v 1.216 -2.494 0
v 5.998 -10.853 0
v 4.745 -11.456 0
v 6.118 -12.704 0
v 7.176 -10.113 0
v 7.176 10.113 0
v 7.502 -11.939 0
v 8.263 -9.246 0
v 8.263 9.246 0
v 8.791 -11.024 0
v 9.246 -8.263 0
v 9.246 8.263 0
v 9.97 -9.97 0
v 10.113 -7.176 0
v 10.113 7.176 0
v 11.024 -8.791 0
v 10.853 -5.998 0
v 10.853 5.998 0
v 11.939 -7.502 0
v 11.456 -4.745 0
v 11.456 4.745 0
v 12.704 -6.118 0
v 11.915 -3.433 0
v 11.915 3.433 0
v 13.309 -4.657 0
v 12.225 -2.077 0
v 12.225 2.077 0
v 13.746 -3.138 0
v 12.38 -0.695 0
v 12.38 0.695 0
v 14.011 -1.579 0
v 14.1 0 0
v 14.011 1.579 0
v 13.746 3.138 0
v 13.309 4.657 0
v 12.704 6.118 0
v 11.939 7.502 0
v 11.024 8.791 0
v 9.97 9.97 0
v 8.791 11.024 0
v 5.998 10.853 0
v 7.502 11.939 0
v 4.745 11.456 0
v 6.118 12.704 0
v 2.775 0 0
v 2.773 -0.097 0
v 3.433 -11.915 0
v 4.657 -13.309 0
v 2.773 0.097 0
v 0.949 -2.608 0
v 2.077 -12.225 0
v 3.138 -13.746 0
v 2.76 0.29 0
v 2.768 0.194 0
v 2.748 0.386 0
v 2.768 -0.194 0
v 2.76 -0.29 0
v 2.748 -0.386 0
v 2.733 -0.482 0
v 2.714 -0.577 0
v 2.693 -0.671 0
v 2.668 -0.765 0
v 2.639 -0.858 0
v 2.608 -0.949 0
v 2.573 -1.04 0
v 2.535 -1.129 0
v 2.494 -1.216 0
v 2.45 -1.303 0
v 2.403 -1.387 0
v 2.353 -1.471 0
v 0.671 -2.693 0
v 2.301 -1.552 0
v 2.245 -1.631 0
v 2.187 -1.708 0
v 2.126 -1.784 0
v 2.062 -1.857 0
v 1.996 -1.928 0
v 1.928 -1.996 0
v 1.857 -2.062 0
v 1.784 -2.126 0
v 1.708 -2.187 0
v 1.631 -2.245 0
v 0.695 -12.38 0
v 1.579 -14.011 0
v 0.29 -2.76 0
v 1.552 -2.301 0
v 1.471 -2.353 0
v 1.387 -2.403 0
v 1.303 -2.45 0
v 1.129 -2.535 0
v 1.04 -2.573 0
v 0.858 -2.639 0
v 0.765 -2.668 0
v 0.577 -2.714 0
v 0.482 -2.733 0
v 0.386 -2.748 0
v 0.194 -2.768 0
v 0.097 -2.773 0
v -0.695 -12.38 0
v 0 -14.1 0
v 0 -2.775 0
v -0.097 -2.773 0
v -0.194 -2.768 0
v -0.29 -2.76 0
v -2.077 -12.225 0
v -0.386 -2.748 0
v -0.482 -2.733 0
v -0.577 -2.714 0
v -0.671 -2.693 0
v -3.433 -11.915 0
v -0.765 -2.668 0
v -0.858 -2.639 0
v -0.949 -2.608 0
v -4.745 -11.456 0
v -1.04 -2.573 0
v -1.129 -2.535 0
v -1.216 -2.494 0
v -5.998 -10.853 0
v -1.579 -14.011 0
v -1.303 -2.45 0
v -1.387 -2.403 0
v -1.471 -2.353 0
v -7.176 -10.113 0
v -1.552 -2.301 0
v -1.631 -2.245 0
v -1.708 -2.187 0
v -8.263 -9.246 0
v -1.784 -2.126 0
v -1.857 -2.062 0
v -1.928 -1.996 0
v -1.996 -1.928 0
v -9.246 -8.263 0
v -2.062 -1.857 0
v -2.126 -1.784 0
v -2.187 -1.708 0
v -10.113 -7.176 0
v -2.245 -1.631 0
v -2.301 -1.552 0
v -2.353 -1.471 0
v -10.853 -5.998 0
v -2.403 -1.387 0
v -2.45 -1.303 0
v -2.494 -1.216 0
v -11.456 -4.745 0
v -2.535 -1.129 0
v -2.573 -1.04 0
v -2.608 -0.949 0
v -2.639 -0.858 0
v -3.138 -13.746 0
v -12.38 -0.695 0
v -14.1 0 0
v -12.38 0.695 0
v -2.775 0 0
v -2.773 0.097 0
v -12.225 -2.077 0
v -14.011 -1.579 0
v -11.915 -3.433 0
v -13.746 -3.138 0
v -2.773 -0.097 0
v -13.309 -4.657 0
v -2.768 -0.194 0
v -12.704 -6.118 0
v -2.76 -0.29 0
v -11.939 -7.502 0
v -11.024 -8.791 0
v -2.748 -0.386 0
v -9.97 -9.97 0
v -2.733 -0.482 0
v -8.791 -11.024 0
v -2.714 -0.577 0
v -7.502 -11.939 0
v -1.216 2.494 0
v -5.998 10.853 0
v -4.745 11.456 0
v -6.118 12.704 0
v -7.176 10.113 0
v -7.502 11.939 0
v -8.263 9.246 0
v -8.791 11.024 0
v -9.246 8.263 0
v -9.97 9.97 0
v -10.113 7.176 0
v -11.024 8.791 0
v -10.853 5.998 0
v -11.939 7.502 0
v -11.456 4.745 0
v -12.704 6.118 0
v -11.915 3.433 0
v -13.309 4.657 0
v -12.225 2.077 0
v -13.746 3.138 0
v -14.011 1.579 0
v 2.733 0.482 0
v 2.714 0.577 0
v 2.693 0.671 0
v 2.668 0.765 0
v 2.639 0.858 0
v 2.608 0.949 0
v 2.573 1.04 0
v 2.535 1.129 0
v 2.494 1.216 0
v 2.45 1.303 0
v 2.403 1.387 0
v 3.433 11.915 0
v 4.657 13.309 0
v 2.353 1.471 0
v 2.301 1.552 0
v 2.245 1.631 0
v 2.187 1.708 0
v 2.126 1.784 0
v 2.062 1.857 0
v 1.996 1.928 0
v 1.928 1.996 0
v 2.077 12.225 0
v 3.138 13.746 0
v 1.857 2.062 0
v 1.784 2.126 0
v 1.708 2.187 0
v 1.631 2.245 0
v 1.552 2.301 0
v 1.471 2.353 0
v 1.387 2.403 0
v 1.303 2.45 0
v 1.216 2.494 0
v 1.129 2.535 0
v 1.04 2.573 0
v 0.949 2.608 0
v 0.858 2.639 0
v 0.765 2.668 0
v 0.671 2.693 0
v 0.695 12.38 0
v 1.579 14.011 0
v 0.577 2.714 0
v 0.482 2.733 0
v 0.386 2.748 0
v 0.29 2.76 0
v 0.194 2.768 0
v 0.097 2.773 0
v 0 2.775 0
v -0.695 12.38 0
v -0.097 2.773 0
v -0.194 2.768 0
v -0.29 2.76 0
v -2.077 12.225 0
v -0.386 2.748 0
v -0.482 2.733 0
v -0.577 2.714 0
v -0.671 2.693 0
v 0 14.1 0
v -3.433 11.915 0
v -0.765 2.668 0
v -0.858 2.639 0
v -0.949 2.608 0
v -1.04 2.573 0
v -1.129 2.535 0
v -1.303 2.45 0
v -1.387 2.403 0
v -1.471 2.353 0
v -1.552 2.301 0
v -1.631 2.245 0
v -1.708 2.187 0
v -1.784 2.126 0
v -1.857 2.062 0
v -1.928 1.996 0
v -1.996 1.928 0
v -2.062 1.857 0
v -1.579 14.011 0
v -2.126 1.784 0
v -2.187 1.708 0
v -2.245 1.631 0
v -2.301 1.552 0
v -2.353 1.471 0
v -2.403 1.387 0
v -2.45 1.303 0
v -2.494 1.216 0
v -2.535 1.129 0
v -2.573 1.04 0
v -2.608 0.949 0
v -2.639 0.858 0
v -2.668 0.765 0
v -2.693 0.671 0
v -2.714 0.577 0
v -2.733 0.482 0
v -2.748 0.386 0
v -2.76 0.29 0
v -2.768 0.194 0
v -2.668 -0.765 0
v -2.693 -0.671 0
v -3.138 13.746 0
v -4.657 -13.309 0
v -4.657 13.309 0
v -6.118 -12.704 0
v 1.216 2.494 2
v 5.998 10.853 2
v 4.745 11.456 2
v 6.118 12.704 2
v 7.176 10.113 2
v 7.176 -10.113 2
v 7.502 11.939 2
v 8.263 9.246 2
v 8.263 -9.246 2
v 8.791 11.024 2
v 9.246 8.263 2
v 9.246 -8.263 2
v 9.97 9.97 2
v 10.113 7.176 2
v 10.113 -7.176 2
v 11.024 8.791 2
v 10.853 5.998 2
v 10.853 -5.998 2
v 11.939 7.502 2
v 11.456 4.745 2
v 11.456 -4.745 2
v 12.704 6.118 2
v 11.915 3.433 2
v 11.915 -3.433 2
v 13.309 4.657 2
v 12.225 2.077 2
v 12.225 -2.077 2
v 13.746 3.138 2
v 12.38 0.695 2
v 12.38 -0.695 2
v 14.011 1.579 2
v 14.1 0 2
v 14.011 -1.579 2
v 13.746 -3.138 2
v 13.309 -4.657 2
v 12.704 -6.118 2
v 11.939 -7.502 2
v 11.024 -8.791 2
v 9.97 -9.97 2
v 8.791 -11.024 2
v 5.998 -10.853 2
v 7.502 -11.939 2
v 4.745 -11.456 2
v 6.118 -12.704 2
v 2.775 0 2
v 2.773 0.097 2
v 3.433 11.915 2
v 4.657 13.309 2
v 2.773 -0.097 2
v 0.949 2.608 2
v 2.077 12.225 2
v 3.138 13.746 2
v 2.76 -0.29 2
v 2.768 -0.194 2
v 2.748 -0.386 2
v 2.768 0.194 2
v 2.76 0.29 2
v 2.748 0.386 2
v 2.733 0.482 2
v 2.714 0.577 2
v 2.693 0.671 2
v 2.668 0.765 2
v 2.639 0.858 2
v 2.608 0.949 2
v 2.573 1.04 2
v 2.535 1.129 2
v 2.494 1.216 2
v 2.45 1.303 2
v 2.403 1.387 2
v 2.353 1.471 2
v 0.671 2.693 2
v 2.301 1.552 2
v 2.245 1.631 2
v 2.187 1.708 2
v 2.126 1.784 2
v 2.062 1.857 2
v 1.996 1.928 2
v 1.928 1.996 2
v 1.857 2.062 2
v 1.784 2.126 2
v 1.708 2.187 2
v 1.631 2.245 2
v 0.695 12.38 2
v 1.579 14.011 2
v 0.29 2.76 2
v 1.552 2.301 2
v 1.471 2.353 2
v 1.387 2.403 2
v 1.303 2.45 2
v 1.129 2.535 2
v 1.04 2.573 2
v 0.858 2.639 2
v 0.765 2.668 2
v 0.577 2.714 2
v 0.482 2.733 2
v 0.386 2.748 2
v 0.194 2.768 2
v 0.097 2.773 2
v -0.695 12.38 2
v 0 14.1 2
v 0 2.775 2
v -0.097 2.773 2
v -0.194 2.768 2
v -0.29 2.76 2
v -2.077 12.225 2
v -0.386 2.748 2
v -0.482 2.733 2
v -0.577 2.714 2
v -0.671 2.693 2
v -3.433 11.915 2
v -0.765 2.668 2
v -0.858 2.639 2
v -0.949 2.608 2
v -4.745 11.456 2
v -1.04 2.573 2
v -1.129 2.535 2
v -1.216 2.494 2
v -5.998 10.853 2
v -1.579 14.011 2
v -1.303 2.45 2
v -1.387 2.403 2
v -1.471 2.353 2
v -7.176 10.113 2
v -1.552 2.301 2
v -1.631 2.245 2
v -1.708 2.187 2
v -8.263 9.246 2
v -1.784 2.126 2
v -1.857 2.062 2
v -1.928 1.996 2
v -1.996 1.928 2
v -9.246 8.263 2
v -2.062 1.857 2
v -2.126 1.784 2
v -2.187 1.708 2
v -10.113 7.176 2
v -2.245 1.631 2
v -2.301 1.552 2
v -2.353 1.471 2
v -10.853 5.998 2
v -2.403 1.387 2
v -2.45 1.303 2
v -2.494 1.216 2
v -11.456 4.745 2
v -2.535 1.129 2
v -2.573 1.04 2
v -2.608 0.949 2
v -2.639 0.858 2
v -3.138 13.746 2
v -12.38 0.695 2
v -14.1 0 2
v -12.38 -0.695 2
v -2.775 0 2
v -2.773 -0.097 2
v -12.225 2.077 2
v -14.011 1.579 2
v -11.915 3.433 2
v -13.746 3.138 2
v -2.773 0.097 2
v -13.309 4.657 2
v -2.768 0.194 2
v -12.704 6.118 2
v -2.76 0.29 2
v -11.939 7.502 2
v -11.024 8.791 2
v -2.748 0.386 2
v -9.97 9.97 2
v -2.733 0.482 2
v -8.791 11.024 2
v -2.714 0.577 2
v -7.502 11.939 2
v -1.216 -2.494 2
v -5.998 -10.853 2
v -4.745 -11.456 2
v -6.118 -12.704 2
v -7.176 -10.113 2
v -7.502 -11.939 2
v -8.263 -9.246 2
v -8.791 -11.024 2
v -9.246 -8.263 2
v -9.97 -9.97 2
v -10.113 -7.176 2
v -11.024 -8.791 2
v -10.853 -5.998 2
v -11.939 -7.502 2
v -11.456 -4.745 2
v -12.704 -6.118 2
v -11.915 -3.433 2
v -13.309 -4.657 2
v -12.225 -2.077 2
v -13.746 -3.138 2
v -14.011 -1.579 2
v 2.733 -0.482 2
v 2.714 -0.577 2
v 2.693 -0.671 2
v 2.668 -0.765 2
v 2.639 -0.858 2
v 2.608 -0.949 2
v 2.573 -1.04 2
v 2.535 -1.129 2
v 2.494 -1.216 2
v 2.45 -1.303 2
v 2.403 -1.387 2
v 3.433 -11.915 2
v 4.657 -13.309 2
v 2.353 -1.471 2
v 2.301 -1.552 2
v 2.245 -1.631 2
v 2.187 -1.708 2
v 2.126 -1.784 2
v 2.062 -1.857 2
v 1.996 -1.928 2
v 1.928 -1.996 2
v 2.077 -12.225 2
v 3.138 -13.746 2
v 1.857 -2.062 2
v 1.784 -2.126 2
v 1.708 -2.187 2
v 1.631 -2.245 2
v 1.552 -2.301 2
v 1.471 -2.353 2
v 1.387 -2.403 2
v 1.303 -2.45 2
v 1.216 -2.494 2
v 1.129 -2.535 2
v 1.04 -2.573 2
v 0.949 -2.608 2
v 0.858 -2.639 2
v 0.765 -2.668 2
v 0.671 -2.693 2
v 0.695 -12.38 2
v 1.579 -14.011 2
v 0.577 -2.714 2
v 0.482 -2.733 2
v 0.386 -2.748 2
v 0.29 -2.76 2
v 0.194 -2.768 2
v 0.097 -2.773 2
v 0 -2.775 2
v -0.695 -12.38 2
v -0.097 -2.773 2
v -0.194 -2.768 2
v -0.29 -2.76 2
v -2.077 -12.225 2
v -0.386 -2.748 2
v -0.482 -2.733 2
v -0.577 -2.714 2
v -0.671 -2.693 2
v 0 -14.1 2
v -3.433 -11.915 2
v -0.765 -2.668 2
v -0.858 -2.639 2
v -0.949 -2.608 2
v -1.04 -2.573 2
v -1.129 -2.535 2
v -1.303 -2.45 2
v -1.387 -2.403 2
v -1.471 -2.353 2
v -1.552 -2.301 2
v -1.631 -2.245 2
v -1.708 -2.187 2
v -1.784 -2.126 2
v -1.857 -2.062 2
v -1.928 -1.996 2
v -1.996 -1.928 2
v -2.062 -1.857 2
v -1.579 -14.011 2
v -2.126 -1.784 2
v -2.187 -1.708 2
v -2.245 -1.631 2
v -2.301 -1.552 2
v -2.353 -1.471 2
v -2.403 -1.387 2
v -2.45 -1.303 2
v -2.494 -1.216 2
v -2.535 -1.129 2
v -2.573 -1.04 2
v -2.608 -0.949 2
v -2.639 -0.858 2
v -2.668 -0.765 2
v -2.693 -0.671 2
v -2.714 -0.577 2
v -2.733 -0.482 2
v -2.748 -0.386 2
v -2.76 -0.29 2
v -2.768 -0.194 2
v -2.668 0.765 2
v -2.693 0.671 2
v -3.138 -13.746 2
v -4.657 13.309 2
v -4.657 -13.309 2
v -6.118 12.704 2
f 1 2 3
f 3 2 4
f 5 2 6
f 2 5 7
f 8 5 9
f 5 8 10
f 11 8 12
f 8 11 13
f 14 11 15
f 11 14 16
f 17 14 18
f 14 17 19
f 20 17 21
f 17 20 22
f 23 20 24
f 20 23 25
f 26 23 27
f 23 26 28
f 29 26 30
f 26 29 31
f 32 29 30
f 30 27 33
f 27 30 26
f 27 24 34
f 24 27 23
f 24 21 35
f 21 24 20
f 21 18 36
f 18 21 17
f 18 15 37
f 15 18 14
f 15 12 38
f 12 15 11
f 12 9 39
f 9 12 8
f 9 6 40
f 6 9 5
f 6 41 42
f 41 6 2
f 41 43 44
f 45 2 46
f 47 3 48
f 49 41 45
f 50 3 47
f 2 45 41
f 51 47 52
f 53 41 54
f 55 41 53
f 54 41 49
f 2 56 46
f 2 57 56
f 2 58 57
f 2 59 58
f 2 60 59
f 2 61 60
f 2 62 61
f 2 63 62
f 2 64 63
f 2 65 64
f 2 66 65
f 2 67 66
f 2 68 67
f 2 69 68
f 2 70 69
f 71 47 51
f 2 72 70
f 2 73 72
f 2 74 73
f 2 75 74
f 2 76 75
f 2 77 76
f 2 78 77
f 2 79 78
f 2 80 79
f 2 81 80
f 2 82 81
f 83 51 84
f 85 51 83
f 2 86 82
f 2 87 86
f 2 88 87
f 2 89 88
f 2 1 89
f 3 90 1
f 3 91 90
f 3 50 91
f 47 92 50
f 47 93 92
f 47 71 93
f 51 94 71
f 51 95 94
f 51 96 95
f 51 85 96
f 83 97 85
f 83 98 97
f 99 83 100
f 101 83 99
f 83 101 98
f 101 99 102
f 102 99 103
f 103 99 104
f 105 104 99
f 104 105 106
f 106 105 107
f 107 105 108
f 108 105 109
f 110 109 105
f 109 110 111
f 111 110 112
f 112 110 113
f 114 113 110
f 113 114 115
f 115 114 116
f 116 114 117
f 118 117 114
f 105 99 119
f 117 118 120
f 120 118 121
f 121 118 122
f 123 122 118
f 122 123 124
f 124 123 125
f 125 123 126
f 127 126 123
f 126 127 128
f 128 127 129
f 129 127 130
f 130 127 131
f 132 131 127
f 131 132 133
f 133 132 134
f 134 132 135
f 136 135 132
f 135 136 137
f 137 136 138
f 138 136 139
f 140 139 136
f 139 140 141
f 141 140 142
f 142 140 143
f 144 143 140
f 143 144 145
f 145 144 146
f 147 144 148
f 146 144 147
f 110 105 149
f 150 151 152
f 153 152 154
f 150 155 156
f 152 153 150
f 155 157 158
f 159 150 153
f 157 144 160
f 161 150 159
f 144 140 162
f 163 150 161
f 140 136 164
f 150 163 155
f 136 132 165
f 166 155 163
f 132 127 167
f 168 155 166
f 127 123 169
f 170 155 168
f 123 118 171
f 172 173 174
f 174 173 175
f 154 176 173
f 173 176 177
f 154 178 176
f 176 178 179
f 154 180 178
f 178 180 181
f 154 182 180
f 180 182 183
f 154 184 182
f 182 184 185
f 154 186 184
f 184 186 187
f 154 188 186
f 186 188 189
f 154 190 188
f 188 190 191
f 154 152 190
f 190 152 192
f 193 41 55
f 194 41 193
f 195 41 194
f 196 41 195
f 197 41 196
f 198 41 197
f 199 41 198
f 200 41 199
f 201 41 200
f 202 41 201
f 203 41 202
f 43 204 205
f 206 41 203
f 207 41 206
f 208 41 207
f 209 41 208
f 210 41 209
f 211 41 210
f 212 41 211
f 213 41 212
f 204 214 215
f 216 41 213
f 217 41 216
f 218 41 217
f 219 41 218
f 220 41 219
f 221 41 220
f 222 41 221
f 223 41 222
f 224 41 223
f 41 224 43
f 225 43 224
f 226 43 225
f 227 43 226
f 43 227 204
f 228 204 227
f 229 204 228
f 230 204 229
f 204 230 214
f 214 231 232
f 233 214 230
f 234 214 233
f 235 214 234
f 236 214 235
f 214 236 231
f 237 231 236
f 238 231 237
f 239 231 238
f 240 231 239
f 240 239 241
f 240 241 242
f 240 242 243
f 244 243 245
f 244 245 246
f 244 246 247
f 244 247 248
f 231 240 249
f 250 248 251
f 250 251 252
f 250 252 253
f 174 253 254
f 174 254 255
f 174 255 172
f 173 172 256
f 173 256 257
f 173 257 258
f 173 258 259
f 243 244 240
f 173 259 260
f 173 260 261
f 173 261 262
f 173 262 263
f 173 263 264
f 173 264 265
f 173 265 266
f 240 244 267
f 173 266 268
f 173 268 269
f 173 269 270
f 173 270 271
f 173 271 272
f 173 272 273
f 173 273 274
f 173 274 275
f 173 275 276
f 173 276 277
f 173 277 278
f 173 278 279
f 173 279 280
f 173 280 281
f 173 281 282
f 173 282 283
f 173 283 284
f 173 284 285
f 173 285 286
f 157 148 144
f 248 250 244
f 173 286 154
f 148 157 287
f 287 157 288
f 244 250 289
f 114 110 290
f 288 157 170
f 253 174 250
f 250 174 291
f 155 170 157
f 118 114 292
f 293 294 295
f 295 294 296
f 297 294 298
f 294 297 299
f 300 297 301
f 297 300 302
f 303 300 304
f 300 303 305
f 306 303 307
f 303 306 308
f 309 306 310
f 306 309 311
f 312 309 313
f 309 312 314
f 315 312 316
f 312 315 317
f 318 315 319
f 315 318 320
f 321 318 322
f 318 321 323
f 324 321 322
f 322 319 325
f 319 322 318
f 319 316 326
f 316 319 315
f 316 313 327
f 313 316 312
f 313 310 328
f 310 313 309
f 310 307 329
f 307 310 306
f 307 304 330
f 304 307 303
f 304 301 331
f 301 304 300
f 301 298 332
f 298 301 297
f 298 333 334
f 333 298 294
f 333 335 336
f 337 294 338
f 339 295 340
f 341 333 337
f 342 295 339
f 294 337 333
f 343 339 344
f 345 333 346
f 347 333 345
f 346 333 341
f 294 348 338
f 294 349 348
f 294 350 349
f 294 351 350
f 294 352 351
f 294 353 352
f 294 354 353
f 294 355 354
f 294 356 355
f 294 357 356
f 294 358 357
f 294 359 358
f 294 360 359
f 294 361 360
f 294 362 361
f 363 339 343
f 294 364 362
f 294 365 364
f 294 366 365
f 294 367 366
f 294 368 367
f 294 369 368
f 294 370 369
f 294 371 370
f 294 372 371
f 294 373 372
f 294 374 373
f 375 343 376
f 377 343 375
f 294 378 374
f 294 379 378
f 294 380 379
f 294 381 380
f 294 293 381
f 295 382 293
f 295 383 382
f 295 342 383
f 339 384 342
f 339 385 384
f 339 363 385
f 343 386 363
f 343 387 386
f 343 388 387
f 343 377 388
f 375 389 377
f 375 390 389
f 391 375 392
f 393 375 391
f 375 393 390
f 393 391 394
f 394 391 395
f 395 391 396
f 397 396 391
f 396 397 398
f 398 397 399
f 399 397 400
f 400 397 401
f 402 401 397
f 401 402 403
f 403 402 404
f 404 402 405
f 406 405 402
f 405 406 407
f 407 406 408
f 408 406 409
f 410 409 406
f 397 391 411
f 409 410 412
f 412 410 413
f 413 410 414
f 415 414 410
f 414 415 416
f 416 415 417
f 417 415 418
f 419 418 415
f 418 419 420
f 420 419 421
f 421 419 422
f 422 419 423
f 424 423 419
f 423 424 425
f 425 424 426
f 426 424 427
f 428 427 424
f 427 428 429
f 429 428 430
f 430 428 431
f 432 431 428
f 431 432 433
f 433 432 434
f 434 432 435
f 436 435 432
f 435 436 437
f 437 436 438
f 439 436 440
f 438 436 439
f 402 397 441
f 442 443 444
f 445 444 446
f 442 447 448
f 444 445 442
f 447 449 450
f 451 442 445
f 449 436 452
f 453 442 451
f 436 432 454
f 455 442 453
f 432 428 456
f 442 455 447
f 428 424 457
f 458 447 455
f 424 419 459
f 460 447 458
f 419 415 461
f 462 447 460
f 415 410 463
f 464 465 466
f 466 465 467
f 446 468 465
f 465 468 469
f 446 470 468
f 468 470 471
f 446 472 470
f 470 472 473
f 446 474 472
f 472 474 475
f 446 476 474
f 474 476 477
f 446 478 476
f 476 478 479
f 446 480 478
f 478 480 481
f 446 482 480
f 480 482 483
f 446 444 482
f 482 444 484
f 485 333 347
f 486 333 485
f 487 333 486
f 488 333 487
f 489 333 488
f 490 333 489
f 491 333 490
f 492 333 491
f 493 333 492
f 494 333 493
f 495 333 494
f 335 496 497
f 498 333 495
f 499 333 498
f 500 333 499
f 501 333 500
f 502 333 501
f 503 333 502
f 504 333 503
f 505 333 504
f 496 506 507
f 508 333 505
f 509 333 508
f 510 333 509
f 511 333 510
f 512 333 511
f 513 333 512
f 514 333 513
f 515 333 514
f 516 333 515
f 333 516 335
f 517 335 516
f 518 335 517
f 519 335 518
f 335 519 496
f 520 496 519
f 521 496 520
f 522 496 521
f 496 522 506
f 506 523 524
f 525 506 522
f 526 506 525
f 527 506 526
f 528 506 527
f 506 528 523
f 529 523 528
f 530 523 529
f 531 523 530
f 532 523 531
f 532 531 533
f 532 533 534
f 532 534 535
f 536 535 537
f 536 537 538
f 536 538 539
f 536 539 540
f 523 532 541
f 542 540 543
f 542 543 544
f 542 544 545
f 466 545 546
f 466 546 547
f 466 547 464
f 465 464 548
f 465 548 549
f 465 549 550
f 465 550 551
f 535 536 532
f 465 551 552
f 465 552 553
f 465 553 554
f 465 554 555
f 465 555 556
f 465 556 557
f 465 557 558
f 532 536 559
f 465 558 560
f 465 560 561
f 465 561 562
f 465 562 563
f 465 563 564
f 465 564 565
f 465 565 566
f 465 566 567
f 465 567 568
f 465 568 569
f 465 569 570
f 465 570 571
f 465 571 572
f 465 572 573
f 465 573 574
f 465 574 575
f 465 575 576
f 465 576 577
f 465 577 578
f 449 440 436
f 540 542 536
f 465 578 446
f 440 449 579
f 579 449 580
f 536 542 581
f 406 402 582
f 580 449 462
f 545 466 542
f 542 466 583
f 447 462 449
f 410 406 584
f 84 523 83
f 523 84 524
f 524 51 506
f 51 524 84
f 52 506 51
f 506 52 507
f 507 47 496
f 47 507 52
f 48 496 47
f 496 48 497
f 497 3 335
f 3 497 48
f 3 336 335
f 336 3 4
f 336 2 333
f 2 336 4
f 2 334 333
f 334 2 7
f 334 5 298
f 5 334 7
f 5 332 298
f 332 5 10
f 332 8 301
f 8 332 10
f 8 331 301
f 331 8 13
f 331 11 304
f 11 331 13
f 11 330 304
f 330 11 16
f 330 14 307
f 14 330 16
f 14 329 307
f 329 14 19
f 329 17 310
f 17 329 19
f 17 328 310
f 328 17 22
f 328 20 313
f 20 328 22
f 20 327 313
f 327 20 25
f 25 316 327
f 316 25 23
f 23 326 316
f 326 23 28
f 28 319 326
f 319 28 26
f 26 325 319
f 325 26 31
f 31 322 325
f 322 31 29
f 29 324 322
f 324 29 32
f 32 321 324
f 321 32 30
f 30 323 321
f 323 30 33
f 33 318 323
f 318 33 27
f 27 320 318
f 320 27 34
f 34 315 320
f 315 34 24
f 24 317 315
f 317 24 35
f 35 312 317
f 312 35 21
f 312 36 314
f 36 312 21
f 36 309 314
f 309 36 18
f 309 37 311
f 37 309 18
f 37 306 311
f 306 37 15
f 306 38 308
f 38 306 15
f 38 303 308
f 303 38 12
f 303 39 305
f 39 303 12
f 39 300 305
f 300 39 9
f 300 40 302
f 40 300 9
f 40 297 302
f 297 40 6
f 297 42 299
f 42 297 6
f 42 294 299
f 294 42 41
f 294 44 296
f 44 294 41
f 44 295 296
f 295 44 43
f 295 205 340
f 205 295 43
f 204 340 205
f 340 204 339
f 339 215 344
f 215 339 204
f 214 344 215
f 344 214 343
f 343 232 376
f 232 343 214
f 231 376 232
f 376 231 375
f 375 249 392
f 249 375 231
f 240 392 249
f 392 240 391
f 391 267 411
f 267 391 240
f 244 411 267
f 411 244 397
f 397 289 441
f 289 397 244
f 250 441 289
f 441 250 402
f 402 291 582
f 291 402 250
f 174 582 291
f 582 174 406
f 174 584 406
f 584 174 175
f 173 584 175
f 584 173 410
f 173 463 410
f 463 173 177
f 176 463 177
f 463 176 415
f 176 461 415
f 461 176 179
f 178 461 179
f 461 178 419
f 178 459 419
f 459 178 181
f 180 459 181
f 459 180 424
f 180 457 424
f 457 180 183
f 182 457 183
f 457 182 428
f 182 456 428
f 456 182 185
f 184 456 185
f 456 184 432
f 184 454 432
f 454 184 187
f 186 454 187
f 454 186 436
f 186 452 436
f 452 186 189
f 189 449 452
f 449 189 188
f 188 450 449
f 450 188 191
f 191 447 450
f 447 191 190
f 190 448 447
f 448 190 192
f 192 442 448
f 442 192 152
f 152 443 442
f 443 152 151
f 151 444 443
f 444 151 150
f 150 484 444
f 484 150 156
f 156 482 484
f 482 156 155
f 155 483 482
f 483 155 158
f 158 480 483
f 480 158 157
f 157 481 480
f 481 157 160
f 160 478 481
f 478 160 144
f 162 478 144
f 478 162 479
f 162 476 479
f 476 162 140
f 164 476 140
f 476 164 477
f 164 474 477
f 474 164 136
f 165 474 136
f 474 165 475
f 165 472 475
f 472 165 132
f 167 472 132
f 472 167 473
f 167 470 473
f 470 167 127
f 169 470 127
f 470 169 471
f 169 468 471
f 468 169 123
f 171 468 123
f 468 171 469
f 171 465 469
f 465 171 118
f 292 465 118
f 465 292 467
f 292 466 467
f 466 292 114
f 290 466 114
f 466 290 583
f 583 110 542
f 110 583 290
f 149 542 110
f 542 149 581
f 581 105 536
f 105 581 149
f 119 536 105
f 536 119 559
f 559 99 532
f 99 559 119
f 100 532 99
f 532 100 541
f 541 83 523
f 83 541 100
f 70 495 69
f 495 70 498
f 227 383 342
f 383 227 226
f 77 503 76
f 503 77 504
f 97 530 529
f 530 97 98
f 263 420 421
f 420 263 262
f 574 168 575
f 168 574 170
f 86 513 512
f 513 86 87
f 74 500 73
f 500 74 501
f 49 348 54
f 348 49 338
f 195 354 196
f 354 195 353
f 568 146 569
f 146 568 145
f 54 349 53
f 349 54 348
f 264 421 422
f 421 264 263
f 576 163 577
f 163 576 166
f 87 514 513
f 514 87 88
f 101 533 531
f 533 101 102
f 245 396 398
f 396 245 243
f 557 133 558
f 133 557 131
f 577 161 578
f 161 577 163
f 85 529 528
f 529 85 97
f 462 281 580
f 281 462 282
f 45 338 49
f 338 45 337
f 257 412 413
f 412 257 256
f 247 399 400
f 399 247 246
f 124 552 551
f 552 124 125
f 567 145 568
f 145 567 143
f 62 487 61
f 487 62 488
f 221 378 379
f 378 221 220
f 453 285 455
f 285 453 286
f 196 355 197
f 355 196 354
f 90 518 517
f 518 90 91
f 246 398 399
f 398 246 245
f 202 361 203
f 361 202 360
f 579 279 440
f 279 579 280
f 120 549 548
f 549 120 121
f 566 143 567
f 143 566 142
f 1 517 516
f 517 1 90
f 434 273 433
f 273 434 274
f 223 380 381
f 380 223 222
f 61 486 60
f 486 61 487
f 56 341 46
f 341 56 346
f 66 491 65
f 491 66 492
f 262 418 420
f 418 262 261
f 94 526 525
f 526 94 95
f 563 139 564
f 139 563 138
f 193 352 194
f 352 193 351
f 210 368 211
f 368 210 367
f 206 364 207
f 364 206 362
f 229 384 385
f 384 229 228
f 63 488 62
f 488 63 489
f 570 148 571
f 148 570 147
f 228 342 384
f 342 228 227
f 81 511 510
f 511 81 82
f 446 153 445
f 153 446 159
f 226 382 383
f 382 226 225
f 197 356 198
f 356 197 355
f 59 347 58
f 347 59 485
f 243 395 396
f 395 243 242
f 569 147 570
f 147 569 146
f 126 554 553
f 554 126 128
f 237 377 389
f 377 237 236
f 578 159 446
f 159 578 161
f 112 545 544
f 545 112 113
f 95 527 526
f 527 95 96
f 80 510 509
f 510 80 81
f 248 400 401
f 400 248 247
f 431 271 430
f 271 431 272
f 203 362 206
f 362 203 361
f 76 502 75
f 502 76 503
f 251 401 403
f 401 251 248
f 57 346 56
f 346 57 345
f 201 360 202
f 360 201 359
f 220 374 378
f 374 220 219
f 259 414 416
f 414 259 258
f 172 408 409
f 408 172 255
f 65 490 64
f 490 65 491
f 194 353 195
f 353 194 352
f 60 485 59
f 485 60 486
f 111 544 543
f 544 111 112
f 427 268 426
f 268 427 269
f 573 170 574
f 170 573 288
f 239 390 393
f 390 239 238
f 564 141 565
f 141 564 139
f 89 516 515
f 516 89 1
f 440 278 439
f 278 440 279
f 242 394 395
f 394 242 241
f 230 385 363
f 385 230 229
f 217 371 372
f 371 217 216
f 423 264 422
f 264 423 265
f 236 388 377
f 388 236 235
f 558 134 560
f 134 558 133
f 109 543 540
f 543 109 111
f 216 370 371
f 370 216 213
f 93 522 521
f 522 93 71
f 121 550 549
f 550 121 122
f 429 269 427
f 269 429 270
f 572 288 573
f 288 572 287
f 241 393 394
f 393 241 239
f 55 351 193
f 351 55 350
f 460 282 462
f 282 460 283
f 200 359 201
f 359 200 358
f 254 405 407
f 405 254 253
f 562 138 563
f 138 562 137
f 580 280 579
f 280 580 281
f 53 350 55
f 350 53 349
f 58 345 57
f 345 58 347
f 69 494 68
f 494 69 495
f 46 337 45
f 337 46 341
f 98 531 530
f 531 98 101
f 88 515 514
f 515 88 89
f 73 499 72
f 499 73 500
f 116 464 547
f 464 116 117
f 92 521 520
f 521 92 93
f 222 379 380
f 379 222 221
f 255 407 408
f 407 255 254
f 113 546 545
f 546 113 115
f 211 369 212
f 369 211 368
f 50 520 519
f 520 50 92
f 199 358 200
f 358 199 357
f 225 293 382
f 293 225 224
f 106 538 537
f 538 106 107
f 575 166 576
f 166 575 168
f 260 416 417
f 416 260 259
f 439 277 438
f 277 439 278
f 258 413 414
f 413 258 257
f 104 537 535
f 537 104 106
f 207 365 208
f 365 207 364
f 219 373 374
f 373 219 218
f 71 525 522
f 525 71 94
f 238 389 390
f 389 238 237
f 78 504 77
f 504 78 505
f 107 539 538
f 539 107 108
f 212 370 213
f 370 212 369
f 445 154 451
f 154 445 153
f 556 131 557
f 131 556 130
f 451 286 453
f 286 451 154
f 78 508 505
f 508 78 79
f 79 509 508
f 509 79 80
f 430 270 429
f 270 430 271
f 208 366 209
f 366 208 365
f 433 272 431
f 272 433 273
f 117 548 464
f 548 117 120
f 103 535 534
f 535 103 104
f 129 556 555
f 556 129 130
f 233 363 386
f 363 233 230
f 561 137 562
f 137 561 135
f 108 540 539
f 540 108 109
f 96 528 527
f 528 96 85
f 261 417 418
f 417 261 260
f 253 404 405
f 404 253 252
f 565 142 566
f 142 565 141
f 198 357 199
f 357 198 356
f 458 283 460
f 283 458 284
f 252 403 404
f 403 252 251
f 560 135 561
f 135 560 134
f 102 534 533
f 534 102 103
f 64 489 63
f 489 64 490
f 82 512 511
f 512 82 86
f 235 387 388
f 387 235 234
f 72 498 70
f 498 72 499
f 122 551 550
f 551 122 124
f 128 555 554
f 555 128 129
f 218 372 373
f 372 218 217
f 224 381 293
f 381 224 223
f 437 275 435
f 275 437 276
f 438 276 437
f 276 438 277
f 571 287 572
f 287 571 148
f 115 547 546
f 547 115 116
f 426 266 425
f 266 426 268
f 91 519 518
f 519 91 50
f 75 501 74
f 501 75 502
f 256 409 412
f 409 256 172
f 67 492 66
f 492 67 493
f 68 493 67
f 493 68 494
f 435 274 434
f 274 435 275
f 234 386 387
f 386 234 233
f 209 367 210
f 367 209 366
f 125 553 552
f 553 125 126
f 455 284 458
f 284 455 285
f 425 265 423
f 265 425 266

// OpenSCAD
//
// Antikythera printable parts (param + tolerance-friendly)
// Units: mm
//
// SPDX-License-Identifier: MIT

$fn = 180;

// --------- What to generate ----------
PART = "a1";  // "a1","a2","a3","a4","a5","a6","a7","a8","a9","a10","a11","a12","all"

// --------- Print tolerance controls ----------
/*
  Typical starting points:
  - FDM (0.4 nozzle): hole_oversize=0.25..0.40, clearance=0.20..0.35
  - Resin:            hole_oversize=0.10..0.20, clearance=0.10..0.20
*/
hole_oversize = 0.30;     // added to DIAMETER of holes
clearance     = 0.25;     // general fit clearance (diameter/width)
chamfer       = 0.40;     // quick chamfer amount for printed edges (visual + assembly help)

// -----------------------------
// Helpers
// -----------------------------
module obround_2d(L, W) {   // slot / stadium shape
    W2 = max(W, 0.01);
    L2 = max(L, W2);
    r = W2/2;
    hull() {
        translate([-(L2/2 - r), 0]) circle(r=r);
        translate([ (L2/2 - r), 0]) circle(r=r);
    }
}

module rounded_rect_2d(w, h, r) {
    r2 = min(r, min(w,h)/2);
    hull() {
        translate([ w/2 - r2,  h/2 - r2]) circle(r=r2);
        translate([-w/2 + r2,  h/2 - r2]) circle(r=r2);
        translate([ w/2 - r2, -h/2 + r2]) circle(r=r2);
        translate([-w/2 + r2, -h/2 + r2]) circle(r=r2);
    }
}

module quick_chamfer_cyl(d, h, ch) {
    // simple chamfer approximation (good enough for prints)
    union() {
        translate([0,0,ch]) cylinder(d=d, h=max(h-2*ch, 0.01));
        cylinder(d1=max(d-2*ch,0.01), d2=d, h=ch);
        translate([0,0,h-ch]) cylinder(d1=d, d2=max(d-2*ch,0.01), h=ch);
    }
}

module hole_cyl(d, h) { cylinder(d=d + hole_oversize, h=h); }

// -----------------------------
// a10: Disk (Ø111, thickness 3.0) + center slot (Ø9.0 with R1.50 ends)
// -----------------------------
module part_a10(
    d_disk=111,
    t=3.0,
    slot_end_r=1.50,
    slot_len=9.0 + 2*1.50  // a reasonable interpretation: obround with Ø9 “waist” and R1.50 ends
) {
    difference() {
        cylinder(d=d_disk, h=t);
        translate([0,0,-0.5])
            linear_extrude(height=t+1.0)
                obround_2d(L=slot_len, W=2*slot_end_r);
    }
}

// -----------------------------
// a11: Gear lock ring / split lock washer
// Aligned with the active DRW-001 `a11_gear_lock.scad` interpretation.
// -----------------------------
module part_a11(od=18.0, id=9.0, th=1.5, gap_w=2.0) {
    difference() {
        cylinder(d=od, h=th, center=false);
        translate([0,0,-0.5]) cylinder(d=id, h=th+1.0, center=false);
        translate([0,-gap_w/2,-0.5]) cube([od/2 + 1, gap_w, th + 1.0], center=false);
    }
}

// -----------------------------
// a9: Axle (main Ø14, step Ø9, overall height 46.4, with small features)
// This matches the visible key dims: Ø14, Ø9, 32, 11.4, 46.4, and a Ø2 cross hole marker.
// -----------------------------
module part_a9(
    d_main=14.0,
    len_main=32.0,
    d_step=9.0,
    len_step=11.4,
    len_total=46.4,
    cross_hole_d=2.0
) {
    // derive tail length to hit overall
    tail = max(len_total - (len_main + len_step), 0.0);

    difference() {
        union() {
            // main body
            quick_chamfer_cyl(d_main - clearance, len_main, chamfer);

            // step
            translate([0,0,len_main])
                quick_chamfer_cyl(d_step - clearance, len_step, chamfer);

            // tail (keep it same as step unless you want it different)
            if (tail > 0.01)
                translate([0,0,len_main+len_step])
                    quick_chamfer_cyl(d_step - clearance, tail, chamfer);
        }

        // cross hole near the top section (approx placement)
        translate([0,0,len_main + len_step*0.55])
            rotate([90,0,0])
                hole_cyl(cross_hole_d, d_main*2);
    }
}

// -----------------------------
// a8: Pins x2 (Ø3.0 x ~11, with small radius ends)
// -----------------------------
module part_a8(d=3.0, L=11.0) {
    hull() {
        translate([0,0,0]) sphere(d=d);
        translate([L,0,0]) sphere(d=d);
    }
}

// -----------------------------
// a2: Washer (Ø16 OD, Ø10 ID, thickness 0.7)
// -----------------------------
module part_a2(d_od=16.0, d_id=10.0, t=0.7) {
    difference() {
        cylinder(d=d_od, h=t);
        translate([0,0,-0.5]) hole_cyl(d_id, t+1.0);
    }
}

// -----------------------------
// a5: Washer (Ø12 OD, Ø8 ID, thickness 1.5)
// -----------------------------
module part_a5(d_od=12.0, d_id=8.0, t=1.5) {
    difference() {
        cylinder(d=d_od, h=t);
        translate([0,0,-0.5]) hole_cyl(d_id, t+1.0);
    }
}

// -----------------------------
// a6: Tube (Ø11.8 OD, ID = R4.0 => Ø8.0, height 17) + side windows + U-slot
// Windows sizes from drawing: slot height 8.8, slot width 6.4-ish shown; keep param.
// -----------------------------
module part_a6(
    d_od=11.8,
    d_id=8.0,
    h=17.0,
    window_w=3.0,
    window_h=8.8,
    window_inset=0.8,
    u_slot_w=3.0,
    u_slot_depth=6.4
) {
    difference() {
        // tube body
        difference() {
            quick_chamfer_cyl(d_od, h, chamfer);
            translate([0,0,-0.5]) hole_cyl(d_id + clearance, h+1.0);
        }

        // two side windows opposite each other
        for (ang=[0,180]) {
            rotate([0,0,ang])
                translate([d_od/2 - window_inset, 0, (h-window_h)/2])
                    rotate([0,90,0])
                        linear_extrude(height=2.2, center=true)
                            rounded_rect_2d(window_h, window_w, r=window_w/2);
        }

        // U-slot from bottom
        translate([0,0,-0.5])
            linear_extrude(height=u_slot_depth+0.5)
                obround_2d(L=d_id + 1.0, W=u_slot_w + clearance);
    }
}

// -----------------------------
// a4 / a7: Block with rounded corners + bore + top posts
// a4 dimensions shown: width 16, height 32.2, corner R8, bore Ø10.
// Posts Ø2.9, top details 3.0 and 2.0 tall segments shown.
// We'll keep as a printable interpretation.
// -----------------------------
module part_a4(
    w=16.0,
    H=32.2,
    t=8.0,          // thickness not clearly shown; adjust if needed
    corner_r=8.0,
    bore_d=10.0,
    bore_z=17.6,    // from drawing (centerline region)
    post_d=2.9,
    post_h=3.0,
    post_spacing=8.0
) {
    difference() {
        linear_extrude(height=t)
            rounded_rect_2d(w, H, corner_r);

        // through-bore (front-to-back)
        translate([0,0,bore_z])
            rotate([90,0,0])
                hole_cyl(bore_d + clearance, H + 2);
    }

    // top posts
    translate([0,0,t])
    for (sx=[-1,1]) {
        translate([sx*post_spacing/2, H/2 - 2.50, 0])
            cylinder(d=post_d - clearance, h=post_h);
    }
}

// a7 looks like a variant; use same geometry unless you later differentiate
module part_a7() { part_a4(); }

// -----------------------------
// a1: Gear (printable placeholder: outer/root radii from drawing + simple tooth bumps)
// Outer radius ~14.1, root radius ~12.4, thickness 2.0.
// Tooth count is not specified clearly -> param default.
// -----------------------------
module part_a1(teeth=56, r_outer=14.1, r_root=12.4, t=2.0, bore_r=2.5) {
    difference() {
        linear_extrude(height=t)
            polygon(points=[
                for (i=[0:teeth*2-1]) let(
                    a=i*180/teeth,
                    rr=(i%2==0)?r_outer:r_root
                ) [ rr*cos(a), rr*sin(a) ]
            ]);

        translate([0,0,-0.5]) hole_cyl(bore_r*2 + clearance, t+1.0);
    }
}

// -----------------------------
// a3: Small cam-like part (placeholder solid so you can print/test fit)
// -----------------------------
module part_a3(d=9.8, h=16.8, flat=2.0) {
    // simple cylinder with a flat
    difference() {
        cylinder(d=d, h=h);
        translate([d/2 - flat, -d, -0.5]) cube([d, 2*d, h+1.0]);
    }
}

// -----------------------------
// a12: Link plate (printable interpretation from drawing)
// Hole Ø3, spacing 19.5, end radii R5/R2.5, thickness ~1.0
// -----------------------------
module part_a12(th=1.0, hole_d=3.0, center_dist=19.5, r_left=5.0, r_right=2.5) {
    difference() {
        linear_extrude(height=th)
            hull() {
                translate([0,0]) circle(r=r_left);
                translate([center_dist,0]) circle(r=r_right);
            }

        translate([0,0,-0.5]) hole_cyl(hole_d, th+1.0);
        translate([center_dist,0,-0.5]) hole_cyl(hole_d, th+1.0);
    }
}

// -----------------------------
// Part selector
// -----------------------------
module render_part(name) {
    if (name=="a1") part_a1();
    else if (name=="a2") part_a2();
    else if (name=="a3") part_a3();
    else if (name=="a4") part_a4();
    else if (name=="a5") part_a5();
    else if (name=="a6") part_a6();
    else if (name=="a7") part_a7();
    else if (name=="a8") part_a8();
    else if (name=="a9") part_a9();
    else if (name=="a10") part_a10();
    else if (name=="a11") part_a11();
    else if (name=="a12") part_a12();
    else if (name=="all") {
        // layout for batch exporting (spaced out)
        translate([-40,  0,0]) part_a10();
        translate([ 40,  0,0]) part_a1();
        translate([-40, 40,0]) part_a4();
        translate([  0, 40,0]) part_a6();
        translate([ 40, 40,0]) part_a9();
        translate([-40,-40,0]) part_a2();
        translate([  0,-40,0]) part_a5();
        translate([ 40,-40,0]) part_a12();
        translate([  0,-65,0]) part_a11();
        translate([ 60,-65,0]) part_a8();
        translate([ 70,-65,0]) part_a8();
    }
}

render_part(PART);
